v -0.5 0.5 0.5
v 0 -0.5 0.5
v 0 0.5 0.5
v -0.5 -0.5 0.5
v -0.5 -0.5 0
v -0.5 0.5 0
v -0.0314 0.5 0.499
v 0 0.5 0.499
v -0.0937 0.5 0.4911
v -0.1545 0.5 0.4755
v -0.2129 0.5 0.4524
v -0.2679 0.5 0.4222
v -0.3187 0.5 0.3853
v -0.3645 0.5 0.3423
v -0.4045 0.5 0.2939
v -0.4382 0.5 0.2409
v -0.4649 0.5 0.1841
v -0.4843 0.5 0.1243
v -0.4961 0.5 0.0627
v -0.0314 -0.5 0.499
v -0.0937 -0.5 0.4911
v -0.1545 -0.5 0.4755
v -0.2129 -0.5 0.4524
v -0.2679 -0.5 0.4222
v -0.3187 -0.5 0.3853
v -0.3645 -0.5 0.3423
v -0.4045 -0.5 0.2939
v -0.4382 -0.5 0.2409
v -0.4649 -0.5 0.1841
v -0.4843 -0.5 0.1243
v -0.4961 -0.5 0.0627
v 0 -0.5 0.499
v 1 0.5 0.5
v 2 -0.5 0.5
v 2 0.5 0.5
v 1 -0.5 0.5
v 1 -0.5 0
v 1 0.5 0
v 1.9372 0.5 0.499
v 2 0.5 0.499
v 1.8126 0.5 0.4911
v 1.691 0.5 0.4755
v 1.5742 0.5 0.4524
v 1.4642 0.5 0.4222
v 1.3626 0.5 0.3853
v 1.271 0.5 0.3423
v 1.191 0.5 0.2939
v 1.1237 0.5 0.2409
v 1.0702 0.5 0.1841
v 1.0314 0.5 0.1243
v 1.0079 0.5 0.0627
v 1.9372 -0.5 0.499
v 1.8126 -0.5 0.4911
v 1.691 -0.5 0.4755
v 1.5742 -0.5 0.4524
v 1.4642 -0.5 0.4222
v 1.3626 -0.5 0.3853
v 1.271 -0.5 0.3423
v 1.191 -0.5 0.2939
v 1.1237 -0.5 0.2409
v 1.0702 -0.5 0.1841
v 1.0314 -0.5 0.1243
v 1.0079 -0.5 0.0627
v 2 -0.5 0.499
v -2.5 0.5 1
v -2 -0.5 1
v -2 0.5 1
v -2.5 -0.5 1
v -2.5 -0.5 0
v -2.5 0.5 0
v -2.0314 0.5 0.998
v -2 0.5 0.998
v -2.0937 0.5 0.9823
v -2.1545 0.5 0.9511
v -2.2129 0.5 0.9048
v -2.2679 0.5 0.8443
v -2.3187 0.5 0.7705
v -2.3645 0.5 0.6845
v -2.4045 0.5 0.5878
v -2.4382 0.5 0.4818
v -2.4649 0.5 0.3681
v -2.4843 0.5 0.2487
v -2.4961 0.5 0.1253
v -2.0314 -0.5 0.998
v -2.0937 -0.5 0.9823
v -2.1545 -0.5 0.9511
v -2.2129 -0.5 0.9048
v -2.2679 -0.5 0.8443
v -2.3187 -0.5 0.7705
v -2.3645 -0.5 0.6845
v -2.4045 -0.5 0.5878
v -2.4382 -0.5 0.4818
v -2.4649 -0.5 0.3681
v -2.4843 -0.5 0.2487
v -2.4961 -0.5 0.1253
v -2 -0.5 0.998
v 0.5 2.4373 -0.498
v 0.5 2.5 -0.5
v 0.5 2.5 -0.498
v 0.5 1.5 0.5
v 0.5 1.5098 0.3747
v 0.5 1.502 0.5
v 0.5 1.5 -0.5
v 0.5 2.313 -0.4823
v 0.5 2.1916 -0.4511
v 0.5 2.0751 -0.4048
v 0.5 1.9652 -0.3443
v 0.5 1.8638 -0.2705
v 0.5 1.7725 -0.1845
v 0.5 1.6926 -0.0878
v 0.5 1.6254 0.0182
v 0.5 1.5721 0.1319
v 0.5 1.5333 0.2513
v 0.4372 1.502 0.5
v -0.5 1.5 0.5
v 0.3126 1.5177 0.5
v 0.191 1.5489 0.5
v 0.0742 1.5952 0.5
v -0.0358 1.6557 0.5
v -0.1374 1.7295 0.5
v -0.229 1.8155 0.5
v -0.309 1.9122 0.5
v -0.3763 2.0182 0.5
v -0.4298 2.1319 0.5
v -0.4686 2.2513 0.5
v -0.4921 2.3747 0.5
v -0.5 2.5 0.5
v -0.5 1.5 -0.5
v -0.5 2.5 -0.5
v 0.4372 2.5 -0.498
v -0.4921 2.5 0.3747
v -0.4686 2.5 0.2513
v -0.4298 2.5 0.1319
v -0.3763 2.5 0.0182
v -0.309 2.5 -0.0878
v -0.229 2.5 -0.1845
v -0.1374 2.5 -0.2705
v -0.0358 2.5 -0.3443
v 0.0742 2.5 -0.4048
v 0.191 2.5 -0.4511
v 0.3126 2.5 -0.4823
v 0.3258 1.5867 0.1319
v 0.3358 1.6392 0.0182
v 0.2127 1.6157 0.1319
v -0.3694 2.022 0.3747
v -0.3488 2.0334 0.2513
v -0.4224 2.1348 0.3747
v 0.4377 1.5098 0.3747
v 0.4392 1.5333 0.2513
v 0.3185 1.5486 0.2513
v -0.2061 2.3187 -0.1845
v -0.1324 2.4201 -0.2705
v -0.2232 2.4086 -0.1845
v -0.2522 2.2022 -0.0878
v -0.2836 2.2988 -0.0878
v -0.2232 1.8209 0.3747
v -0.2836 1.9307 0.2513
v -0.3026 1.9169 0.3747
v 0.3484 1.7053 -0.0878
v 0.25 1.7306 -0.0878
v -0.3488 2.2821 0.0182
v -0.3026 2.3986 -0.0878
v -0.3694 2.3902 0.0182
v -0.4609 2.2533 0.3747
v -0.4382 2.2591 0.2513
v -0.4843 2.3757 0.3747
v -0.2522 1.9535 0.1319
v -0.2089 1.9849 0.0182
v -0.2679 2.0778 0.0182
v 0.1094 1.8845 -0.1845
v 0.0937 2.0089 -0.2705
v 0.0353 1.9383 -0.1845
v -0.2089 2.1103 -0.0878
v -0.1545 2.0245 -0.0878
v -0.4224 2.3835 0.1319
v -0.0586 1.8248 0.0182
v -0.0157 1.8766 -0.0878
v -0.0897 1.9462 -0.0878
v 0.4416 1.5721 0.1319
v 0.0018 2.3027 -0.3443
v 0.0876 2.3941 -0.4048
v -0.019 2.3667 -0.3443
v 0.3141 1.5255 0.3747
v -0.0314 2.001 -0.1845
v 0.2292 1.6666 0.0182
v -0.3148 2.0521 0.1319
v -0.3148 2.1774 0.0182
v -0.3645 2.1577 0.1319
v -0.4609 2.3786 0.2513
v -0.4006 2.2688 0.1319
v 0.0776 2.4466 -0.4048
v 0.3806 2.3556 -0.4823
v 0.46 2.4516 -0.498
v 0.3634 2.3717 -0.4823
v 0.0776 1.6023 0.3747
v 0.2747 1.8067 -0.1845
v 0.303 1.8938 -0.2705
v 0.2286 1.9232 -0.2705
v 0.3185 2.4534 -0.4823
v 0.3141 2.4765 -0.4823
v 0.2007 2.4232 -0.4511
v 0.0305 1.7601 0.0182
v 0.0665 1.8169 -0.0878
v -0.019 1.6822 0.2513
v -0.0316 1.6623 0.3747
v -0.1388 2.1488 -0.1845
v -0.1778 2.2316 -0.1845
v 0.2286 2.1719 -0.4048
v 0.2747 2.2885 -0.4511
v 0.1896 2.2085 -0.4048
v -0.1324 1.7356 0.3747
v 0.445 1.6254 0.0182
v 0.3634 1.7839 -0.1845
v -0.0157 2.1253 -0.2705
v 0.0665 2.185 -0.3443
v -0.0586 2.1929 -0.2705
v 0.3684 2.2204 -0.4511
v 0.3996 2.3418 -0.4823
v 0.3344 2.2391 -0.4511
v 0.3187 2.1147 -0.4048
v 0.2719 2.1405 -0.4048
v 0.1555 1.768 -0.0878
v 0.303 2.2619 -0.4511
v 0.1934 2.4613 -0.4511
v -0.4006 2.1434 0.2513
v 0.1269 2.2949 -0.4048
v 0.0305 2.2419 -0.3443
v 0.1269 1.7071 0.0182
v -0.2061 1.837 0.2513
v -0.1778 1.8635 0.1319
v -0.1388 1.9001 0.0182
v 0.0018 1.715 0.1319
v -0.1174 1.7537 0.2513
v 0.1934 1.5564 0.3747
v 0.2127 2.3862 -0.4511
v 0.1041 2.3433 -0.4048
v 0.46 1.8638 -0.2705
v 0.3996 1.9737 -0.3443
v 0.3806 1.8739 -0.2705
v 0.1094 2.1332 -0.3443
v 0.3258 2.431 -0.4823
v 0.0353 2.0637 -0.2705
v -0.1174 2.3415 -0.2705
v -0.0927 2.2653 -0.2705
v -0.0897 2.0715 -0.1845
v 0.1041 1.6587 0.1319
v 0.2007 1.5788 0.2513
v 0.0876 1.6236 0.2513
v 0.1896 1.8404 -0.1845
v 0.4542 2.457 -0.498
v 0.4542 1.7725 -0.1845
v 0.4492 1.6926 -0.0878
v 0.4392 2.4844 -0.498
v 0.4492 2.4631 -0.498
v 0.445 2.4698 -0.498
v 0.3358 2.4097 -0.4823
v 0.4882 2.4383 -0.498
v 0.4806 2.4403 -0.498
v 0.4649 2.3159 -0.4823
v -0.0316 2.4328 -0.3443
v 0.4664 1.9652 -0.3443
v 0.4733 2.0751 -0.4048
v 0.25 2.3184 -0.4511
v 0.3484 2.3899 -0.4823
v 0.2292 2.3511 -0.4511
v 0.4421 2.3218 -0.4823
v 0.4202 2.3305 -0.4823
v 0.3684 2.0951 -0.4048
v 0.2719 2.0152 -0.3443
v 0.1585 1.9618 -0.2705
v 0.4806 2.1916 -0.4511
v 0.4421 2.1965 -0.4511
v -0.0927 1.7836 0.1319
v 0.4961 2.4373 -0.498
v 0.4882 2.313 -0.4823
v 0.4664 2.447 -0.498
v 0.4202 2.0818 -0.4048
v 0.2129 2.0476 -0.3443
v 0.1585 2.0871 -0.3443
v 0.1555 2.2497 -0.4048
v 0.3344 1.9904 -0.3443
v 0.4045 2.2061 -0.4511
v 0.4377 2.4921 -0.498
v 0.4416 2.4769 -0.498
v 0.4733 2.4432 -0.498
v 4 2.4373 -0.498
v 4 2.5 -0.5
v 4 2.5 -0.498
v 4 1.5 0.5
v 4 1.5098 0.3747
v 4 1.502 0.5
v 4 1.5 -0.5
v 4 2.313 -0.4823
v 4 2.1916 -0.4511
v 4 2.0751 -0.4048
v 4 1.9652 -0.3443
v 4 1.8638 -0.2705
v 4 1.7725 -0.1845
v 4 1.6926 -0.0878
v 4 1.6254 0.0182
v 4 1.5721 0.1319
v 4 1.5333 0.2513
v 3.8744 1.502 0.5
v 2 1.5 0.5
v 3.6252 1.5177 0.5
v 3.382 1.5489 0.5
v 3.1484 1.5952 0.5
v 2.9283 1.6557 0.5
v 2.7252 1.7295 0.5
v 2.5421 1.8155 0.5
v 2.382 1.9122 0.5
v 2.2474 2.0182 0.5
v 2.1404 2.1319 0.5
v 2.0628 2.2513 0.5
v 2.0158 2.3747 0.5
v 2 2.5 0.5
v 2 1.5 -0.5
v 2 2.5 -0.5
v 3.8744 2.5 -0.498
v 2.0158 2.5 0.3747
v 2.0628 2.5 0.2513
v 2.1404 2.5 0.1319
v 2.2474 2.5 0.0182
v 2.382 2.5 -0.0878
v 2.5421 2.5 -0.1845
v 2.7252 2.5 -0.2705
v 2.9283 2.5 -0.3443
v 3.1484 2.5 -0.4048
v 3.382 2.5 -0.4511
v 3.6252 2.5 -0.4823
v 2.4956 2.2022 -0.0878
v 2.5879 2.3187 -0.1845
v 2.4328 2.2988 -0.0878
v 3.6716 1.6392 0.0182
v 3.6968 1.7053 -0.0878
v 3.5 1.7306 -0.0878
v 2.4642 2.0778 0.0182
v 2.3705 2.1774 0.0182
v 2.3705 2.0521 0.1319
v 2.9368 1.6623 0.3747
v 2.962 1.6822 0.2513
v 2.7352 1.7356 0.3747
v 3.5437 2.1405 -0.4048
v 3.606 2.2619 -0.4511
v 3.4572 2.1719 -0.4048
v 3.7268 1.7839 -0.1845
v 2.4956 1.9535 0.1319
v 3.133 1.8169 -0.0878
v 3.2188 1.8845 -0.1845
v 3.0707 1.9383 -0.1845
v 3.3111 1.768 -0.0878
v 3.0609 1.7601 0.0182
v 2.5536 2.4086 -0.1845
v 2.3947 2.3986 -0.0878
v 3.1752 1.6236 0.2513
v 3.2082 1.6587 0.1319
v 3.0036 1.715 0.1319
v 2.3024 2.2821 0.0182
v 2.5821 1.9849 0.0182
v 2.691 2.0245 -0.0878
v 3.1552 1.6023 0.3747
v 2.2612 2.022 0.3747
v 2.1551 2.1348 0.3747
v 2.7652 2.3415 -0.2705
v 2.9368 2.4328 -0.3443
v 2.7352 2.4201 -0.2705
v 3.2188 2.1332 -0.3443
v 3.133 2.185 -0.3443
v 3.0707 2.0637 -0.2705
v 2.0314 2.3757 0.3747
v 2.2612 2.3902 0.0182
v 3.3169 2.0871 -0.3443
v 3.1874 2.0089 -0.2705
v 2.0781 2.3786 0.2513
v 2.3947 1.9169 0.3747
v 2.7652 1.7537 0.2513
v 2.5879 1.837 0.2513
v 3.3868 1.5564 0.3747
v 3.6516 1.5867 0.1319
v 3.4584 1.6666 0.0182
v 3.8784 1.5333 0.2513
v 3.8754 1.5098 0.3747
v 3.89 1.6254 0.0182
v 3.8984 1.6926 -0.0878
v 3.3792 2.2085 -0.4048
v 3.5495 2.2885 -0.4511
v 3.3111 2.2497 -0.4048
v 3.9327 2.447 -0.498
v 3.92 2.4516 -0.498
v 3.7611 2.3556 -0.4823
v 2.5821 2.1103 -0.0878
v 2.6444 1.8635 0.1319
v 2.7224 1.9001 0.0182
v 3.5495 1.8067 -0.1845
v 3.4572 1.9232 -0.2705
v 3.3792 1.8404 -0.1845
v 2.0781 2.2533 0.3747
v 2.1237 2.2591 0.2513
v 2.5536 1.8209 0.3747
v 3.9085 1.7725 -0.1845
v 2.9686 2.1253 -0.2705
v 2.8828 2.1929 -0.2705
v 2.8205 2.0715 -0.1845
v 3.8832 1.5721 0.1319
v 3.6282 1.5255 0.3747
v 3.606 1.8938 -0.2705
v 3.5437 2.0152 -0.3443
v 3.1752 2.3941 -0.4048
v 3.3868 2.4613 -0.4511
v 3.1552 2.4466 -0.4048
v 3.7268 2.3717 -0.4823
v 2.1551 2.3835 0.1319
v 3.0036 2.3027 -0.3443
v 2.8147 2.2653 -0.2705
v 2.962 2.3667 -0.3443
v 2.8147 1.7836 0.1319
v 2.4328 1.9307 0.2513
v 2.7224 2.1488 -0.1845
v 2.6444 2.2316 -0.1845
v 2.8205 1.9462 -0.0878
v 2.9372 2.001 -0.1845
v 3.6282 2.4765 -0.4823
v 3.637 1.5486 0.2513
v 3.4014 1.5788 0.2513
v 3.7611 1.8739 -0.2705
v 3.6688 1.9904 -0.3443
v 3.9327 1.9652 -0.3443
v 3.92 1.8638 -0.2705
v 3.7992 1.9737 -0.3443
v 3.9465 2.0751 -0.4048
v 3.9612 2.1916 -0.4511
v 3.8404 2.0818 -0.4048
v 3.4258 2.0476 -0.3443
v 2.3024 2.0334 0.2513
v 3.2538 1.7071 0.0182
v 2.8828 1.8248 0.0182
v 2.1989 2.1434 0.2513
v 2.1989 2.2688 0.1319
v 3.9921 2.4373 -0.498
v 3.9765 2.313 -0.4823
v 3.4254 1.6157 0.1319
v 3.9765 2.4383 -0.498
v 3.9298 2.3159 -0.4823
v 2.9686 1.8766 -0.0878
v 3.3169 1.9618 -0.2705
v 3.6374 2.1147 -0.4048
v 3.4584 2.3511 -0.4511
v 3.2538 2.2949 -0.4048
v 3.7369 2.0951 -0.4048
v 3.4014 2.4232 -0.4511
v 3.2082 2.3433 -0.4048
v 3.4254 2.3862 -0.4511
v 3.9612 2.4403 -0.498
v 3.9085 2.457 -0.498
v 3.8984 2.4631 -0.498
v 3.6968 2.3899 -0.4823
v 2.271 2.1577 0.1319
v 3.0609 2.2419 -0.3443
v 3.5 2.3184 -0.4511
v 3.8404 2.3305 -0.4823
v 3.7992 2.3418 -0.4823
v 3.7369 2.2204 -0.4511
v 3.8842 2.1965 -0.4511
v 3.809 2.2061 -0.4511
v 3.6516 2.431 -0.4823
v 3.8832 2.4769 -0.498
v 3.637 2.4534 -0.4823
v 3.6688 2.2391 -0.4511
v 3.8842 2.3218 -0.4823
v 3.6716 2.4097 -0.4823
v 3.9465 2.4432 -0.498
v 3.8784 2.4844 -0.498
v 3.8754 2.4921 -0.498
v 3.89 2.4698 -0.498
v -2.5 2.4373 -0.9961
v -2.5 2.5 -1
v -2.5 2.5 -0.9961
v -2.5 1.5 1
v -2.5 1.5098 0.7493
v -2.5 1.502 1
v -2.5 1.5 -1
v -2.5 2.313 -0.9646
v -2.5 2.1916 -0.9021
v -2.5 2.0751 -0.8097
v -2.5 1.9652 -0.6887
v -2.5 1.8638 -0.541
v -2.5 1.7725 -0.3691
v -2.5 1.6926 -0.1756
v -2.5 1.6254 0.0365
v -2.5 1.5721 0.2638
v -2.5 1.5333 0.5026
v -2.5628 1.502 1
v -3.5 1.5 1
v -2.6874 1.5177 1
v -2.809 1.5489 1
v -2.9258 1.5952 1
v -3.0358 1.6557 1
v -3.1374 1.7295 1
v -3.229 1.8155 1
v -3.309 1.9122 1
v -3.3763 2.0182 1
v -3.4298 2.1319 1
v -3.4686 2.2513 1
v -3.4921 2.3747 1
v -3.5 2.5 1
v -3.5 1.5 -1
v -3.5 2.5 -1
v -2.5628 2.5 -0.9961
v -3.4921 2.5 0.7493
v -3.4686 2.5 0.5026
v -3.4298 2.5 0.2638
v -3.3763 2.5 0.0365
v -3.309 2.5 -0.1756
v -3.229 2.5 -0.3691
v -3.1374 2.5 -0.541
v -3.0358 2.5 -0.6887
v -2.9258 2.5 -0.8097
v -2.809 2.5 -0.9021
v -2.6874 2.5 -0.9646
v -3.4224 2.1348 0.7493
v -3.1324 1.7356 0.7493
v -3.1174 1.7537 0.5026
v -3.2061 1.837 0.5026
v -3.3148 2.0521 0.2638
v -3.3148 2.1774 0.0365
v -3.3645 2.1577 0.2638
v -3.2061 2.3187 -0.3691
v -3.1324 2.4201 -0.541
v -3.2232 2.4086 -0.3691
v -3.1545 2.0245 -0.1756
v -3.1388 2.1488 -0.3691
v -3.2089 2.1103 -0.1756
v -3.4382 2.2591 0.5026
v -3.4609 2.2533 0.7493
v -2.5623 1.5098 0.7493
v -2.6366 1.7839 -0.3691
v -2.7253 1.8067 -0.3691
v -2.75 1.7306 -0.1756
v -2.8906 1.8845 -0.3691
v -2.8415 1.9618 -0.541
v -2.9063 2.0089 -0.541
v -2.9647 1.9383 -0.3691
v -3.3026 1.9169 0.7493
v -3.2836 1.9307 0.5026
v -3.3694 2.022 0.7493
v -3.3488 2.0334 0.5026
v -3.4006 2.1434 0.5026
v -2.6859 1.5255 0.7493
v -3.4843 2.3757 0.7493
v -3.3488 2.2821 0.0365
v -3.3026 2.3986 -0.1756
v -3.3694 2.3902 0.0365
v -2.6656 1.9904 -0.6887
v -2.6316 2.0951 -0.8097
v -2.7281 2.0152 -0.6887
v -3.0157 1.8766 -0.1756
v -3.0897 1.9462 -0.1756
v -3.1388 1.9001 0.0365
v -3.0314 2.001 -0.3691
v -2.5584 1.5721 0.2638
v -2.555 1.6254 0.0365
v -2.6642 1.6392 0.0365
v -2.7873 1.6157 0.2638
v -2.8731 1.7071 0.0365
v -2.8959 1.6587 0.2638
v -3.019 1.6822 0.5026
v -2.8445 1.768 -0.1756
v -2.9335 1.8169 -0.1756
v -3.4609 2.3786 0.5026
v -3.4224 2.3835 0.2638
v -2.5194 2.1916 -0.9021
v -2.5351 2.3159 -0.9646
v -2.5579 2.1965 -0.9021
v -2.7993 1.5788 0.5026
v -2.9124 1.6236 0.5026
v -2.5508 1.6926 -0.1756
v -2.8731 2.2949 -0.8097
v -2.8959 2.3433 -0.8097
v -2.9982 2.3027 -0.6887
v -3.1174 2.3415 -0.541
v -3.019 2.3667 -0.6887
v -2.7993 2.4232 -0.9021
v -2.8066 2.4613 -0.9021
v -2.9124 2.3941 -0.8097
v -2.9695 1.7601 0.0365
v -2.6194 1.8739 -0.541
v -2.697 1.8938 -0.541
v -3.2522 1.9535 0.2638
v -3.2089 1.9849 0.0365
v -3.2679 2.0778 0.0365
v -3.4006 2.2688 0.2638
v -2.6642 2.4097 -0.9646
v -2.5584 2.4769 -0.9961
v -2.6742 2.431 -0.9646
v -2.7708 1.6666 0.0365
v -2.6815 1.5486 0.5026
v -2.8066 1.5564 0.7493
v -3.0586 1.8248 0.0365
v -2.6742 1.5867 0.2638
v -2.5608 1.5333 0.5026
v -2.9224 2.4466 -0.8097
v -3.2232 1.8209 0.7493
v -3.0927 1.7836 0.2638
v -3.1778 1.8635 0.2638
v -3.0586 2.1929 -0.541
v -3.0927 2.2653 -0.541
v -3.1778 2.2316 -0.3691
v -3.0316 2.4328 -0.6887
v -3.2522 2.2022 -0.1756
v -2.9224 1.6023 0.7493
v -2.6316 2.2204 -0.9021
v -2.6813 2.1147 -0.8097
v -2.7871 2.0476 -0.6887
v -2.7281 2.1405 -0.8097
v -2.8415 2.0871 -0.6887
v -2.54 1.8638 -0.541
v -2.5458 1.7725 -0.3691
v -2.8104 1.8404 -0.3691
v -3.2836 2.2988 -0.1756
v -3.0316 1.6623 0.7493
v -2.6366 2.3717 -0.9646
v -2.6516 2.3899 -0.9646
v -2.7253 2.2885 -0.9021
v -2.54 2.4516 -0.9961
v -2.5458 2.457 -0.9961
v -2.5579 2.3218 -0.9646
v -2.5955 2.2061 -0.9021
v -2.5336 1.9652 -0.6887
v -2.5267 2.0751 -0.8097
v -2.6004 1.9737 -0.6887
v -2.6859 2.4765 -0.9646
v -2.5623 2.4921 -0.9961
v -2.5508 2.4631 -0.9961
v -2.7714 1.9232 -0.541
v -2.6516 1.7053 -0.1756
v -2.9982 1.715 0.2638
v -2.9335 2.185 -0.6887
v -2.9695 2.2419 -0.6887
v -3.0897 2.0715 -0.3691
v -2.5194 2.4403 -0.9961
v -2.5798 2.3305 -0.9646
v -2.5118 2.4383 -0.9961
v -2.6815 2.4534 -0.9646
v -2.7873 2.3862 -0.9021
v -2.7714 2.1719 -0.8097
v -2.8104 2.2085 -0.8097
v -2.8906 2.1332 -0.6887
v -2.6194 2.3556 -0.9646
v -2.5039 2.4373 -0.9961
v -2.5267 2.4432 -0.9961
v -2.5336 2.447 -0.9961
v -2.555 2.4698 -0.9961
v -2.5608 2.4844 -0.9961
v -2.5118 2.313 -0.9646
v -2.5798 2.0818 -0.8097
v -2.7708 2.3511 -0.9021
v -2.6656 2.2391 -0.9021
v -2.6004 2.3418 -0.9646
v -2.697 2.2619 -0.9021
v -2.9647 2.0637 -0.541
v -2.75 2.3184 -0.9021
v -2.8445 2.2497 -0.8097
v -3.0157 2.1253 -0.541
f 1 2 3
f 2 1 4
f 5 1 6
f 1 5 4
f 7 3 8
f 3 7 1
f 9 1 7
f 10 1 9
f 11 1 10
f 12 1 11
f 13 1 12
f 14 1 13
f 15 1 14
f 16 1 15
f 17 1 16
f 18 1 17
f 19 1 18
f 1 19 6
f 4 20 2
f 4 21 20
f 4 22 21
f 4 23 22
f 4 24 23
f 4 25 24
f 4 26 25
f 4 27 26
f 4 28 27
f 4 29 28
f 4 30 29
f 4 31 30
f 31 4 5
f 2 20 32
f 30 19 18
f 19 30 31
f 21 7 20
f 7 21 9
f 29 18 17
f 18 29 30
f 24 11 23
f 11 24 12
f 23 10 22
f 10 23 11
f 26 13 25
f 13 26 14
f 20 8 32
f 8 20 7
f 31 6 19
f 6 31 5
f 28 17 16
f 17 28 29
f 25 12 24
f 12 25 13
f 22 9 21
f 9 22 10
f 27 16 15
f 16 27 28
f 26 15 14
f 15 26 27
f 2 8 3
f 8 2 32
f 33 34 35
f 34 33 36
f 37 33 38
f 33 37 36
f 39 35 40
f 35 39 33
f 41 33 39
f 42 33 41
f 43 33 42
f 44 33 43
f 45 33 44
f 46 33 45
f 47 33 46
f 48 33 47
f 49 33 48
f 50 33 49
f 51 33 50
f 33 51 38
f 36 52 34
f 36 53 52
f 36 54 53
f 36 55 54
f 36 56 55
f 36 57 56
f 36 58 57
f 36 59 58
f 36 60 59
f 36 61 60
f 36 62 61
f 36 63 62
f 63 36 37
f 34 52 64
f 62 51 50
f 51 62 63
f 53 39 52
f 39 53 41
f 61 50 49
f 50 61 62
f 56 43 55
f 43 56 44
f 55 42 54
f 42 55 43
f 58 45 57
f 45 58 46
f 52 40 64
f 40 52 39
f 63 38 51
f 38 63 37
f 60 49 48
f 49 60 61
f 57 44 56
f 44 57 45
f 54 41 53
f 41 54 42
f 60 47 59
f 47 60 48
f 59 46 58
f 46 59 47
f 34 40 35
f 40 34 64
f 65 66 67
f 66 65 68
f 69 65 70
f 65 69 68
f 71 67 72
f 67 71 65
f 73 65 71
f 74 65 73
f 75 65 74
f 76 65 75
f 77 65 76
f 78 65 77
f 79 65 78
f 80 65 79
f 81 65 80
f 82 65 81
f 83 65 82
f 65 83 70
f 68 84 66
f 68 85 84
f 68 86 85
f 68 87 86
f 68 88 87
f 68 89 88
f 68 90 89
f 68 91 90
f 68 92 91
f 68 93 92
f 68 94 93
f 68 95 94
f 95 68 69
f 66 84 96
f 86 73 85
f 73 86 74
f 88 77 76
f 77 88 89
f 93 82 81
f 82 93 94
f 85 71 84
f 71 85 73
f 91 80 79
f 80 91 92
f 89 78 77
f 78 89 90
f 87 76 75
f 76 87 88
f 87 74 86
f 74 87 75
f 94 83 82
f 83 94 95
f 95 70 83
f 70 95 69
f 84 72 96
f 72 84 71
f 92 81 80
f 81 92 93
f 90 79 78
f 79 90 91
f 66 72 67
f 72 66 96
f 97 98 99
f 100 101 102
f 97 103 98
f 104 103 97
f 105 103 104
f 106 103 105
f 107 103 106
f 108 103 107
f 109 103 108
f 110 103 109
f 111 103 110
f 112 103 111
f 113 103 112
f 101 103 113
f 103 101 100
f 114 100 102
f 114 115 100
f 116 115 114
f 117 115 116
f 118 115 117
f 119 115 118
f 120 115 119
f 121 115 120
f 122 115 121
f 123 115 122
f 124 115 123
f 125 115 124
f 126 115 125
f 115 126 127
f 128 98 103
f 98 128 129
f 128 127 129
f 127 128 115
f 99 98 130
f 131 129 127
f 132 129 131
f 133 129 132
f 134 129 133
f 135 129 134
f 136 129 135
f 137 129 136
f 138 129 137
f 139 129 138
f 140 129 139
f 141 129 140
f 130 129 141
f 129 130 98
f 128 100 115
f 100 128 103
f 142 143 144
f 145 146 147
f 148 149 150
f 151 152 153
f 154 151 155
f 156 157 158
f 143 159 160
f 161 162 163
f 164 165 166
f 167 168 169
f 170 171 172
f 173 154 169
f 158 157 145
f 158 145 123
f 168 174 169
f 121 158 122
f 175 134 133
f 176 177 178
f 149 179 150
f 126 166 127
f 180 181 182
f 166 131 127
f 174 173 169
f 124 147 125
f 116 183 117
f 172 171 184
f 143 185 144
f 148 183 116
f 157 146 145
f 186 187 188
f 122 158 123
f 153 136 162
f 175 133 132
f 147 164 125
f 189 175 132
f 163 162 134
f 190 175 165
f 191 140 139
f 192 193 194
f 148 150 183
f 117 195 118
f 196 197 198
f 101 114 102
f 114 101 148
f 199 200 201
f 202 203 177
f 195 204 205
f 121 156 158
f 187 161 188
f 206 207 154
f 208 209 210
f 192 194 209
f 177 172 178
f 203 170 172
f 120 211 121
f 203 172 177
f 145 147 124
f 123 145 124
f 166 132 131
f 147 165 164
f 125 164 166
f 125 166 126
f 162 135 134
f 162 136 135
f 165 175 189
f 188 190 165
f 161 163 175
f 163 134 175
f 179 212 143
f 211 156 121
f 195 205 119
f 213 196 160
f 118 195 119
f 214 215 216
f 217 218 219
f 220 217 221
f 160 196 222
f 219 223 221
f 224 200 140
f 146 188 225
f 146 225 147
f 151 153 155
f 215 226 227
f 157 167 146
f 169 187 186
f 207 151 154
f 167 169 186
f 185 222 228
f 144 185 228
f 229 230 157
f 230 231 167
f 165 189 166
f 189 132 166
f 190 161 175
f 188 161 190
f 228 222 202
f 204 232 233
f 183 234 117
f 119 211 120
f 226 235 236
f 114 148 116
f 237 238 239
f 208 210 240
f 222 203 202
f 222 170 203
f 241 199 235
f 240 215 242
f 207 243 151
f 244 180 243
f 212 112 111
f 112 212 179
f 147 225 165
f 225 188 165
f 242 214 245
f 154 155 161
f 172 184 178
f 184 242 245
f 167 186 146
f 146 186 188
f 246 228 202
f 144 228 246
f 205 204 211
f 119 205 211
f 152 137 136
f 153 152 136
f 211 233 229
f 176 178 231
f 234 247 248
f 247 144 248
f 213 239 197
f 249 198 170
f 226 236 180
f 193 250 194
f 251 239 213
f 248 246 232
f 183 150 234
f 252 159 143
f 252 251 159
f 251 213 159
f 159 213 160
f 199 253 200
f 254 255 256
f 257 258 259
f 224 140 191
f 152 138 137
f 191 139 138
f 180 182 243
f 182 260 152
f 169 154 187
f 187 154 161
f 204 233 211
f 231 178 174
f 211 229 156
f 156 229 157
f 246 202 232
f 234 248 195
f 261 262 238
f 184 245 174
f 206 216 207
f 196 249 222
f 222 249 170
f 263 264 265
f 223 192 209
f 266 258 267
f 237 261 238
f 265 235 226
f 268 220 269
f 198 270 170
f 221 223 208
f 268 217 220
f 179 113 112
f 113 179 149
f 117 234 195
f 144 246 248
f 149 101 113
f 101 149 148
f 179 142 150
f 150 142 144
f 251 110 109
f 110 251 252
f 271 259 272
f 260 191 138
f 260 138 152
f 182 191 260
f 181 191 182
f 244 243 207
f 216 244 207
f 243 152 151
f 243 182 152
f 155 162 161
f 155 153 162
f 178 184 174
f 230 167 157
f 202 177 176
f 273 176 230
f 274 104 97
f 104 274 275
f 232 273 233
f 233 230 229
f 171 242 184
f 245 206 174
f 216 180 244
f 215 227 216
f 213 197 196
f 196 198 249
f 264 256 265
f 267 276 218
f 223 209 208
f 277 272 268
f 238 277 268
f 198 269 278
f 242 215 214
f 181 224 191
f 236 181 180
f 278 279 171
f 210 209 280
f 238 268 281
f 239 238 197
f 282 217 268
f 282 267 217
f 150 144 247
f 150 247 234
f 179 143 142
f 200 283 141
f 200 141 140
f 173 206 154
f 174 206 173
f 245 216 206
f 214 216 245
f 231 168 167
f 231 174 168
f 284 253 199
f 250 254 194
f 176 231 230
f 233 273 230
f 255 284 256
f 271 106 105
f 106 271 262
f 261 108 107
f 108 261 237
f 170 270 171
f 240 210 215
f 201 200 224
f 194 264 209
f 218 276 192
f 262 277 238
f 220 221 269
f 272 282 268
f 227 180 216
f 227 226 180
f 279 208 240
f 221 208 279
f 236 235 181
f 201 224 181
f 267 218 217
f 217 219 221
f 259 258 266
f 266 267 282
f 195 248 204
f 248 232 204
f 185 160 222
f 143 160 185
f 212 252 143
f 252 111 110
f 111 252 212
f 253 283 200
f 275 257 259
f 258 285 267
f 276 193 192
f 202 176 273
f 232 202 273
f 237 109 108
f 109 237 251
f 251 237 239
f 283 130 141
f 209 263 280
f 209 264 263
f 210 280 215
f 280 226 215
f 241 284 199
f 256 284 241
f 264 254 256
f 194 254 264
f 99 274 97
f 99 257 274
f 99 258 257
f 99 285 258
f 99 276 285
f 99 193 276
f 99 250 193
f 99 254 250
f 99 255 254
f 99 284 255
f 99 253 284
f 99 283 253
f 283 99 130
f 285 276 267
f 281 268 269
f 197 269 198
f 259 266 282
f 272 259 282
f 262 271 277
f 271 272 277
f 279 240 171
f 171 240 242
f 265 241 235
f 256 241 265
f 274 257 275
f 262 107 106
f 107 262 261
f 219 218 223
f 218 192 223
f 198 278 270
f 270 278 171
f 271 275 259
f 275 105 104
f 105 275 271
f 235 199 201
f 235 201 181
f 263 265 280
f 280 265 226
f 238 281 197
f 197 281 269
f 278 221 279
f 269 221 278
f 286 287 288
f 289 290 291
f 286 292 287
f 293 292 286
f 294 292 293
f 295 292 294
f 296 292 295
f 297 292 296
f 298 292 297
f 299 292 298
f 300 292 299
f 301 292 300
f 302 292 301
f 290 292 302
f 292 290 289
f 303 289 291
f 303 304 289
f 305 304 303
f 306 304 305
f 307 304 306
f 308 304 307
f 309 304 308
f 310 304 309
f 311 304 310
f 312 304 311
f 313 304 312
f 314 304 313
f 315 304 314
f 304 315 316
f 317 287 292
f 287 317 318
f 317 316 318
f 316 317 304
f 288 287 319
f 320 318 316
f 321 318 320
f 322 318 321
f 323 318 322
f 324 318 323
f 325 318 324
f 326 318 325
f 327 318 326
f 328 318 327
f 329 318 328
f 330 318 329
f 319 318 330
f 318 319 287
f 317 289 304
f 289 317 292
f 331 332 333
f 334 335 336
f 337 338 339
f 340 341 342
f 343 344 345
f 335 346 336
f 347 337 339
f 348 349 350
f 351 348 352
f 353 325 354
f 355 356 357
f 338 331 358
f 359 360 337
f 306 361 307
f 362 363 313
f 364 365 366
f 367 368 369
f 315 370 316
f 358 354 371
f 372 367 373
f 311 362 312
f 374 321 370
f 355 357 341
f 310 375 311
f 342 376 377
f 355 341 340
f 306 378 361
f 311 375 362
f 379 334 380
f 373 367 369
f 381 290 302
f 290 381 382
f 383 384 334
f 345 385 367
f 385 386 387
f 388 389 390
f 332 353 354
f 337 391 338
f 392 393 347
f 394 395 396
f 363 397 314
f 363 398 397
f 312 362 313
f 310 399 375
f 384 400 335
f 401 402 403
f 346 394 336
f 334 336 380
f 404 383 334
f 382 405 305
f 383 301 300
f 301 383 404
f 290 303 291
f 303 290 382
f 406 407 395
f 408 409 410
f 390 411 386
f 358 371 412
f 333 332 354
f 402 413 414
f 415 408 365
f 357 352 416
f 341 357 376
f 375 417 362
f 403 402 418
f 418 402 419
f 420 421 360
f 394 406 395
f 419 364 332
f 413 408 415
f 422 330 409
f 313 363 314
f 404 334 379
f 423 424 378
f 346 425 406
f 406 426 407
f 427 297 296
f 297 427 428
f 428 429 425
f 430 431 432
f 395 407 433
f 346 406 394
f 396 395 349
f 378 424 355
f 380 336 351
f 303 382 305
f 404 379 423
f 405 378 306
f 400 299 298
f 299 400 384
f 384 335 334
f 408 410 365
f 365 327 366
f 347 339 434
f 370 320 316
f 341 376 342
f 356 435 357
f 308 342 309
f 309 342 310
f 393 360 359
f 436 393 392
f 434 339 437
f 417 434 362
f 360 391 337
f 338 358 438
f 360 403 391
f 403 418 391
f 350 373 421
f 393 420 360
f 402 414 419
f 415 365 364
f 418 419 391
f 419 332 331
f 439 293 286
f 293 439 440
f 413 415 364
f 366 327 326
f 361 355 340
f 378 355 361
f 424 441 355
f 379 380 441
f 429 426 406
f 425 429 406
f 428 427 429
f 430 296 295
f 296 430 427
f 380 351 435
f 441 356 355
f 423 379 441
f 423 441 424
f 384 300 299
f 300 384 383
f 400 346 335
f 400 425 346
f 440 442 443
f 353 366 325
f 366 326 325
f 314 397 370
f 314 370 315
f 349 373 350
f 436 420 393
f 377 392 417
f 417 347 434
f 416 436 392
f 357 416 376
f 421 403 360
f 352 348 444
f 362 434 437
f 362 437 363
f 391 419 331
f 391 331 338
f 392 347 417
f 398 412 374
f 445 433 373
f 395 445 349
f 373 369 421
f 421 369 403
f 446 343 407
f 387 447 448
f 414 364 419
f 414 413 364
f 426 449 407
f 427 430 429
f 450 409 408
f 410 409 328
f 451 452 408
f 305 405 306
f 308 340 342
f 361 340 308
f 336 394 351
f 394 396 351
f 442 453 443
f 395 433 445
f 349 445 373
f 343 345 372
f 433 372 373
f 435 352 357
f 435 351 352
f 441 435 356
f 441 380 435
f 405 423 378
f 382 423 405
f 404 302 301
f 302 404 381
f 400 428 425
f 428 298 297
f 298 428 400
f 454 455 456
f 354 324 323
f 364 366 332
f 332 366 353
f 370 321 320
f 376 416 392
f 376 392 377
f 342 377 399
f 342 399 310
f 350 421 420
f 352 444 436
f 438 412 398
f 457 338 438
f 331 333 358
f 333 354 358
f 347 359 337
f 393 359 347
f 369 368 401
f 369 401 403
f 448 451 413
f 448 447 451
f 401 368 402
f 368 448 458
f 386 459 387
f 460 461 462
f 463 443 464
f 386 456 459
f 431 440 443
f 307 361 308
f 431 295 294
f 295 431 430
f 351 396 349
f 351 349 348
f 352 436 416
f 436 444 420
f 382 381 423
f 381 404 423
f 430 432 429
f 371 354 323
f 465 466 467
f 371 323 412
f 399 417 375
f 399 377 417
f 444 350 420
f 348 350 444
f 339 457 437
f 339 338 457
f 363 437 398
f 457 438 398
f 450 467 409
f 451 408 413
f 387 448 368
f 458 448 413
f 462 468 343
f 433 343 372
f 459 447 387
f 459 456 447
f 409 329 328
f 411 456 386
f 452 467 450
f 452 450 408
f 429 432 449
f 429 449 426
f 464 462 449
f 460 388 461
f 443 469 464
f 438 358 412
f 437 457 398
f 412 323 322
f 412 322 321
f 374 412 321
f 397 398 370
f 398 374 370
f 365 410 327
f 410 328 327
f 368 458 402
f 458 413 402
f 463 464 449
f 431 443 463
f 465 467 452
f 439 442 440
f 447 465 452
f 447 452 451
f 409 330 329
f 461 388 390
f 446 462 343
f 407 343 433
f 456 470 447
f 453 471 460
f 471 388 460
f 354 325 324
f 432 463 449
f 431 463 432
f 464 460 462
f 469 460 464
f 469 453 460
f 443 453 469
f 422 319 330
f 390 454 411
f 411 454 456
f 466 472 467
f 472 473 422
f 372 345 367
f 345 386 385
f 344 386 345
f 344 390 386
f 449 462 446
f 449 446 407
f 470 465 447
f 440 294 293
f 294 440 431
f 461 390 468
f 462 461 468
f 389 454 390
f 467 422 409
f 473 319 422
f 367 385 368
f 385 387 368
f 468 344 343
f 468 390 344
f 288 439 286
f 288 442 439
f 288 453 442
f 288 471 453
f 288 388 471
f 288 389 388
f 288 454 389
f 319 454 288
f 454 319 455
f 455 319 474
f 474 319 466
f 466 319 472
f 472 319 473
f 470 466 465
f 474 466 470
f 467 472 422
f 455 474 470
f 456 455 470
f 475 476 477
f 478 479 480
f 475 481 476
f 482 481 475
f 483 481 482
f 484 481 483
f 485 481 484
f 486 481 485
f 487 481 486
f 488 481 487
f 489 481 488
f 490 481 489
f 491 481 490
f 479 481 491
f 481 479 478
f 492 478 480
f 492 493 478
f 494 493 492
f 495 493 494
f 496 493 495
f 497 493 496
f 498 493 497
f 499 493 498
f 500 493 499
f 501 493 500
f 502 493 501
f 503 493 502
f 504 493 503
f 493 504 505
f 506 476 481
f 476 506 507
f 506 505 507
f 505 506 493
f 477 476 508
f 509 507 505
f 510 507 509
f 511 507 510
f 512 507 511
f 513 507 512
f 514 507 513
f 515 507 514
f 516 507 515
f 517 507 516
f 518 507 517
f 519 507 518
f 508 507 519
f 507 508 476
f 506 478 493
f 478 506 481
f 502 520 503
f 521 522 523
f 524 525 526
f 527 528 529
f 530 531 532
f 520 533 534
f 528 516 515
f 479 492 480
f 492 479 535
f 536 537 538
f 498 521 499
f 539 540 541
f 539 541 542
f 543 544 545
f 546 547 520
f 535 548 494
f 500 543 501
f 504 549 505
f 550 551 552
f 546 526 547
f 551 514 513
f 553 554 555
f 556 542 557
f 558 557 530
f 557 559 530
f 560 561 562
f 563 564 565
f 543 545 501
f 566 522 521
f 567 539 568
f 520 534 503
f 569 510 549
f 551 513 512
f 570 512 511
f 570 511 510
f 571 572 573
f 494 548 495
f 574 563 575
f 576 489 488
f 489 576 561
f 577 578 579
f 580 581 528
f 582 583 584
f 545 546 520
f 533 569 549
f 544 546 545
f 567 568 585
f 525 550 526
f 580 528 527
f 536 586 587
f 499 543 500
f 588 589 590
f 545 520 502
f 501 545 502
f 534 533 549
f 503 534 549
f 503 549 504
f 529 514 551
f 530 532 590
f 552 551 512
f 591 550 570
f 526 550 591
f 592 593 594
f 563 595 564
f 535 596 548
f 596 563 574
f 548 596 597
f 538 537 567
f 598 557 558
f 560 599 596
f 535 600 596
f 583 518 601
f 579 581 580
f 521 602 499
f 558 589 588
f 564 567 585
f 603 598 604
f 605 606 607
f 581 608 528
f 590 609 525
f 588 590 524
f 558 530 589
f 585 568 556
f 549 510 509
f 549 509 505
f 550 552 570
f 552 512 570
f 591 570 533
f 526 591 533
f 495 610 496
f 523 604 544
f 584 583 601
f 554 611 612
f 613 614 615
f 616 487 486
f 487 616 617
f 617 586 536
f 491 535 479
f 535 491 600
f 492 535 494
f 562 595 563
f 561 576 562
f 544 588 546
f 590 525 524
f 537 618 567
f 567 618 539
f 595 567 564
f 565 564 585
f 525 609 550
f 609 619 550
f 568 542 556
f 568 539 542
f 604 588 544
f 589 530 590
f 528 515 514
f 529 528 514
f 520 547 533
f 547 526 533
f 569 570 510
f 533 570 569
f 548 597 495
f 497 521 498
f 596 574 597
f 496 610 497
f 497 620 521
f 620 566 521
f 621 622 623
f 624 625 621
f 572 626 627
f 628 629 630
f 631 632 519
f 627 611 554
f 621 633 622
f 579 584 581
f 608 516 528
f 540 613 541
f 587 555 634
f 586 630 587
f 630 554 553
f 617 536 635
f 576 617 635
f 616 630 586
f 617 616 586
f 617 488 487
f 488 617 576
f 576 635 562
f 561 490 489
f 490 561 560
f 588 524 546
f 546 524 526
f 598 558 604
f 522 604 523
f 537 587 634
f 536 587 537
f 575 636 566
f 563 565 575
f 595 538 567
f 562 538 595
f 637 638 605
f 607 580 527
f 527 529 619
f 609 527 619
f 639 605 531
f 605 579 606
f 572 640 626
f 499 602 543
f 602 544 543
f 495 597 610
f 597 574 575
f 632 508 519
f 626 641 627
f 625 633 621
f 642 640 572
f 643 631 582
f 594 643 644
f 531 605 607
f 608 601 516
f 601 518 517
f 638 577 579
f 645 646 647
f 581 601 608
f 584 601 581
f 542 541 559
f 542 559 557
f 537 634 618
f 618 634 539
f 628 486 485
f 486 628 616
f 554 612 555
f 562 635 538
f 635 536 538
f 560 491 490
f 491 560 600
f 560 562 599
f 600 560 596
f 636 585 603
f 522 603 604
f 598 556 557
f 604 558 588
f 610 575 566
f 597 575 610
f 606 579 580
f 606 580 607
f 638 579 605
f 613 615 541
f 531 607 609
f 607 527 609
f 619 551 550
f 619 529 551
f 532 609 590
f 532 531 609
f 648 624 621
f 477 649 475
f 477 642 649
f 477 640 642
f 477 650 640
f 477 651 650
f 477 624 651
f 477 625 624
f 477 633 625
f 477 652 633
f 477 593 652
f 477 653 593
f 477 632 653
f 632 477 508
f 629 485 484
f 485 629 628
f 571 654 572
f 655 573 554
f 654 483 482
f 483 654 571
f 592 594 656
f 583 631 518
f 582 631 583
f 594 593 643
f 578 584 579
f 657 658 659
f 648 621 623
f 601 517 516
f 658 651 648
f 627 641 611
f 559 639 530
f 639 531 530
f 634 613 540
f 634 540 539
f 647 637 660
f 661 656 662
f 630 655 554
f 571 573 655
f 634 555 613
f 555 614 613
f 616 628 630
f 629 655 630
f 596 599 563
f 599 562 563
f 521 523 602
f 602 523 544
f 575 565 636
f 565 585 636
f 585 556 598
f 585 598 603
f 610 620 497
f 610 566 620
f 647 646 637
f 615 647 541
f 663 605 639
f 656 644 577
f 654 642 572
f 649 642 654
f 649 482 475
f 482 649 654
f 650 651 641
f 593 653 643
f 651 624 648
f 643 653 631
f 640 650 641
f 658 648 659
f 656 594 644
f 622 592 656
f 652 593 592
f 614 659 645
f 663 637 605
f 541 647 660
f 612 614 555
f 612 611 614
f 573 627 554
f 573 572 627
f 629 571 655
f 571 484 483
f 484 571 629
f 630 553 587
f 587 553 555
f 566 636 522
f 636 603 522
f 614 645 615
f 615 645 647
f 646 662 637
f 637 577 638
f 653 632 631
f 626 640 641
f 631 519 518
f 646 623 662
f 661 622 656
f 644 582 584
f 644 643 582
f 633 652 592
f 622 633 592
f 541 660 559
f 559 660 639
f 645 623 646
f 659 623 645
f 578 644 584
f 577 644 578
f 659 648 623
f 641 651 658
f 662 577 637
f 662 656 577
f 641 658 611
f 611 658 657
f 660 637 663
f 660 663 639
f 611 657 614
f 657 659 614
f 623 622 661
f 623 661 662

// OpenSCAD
module make_2d_corner_fillet(width=1, depth=1, height=1, $fn=50){
    difference(){
        cube([width, depth, height], center=true);
        
        scale([1*width, 1, 1*height])
        translate([0,0,0])
        rotate([90,0,0])
        cylinder(d=1, h=depth*2, center=true, $fn=$fn);
        
        translate([width/2,0,0])
        cube([width,depth*2,height*2], center=true);
        
        translate([0,0,-height/2])
        cube([width*2,depth*2,height], center=true);
    }
}

module make_3d_corner_fillet(width=1, depth=1, height=1, $fn=50){
    difference(){
        cube([width, depth, height], center=true);
        translate([width/2, depth/2, height/2])
        scale([width,depth,height])
        sphere(d=2, $fn=$fn);
    }
}

make_2d_corner_fillet();

translate([2,0,0])
make_2d_corner_fillet(width=2);

translate([-2,0,0])
make_2d_corner_fillet(height=2);

translate([0,2,0])
make_3d_corner_fillet();

translate([3,2,0])
make_3d_corner_fillet(width=2);

translate([-3,2,0])
make_3d_corner_fillet(height=2);
